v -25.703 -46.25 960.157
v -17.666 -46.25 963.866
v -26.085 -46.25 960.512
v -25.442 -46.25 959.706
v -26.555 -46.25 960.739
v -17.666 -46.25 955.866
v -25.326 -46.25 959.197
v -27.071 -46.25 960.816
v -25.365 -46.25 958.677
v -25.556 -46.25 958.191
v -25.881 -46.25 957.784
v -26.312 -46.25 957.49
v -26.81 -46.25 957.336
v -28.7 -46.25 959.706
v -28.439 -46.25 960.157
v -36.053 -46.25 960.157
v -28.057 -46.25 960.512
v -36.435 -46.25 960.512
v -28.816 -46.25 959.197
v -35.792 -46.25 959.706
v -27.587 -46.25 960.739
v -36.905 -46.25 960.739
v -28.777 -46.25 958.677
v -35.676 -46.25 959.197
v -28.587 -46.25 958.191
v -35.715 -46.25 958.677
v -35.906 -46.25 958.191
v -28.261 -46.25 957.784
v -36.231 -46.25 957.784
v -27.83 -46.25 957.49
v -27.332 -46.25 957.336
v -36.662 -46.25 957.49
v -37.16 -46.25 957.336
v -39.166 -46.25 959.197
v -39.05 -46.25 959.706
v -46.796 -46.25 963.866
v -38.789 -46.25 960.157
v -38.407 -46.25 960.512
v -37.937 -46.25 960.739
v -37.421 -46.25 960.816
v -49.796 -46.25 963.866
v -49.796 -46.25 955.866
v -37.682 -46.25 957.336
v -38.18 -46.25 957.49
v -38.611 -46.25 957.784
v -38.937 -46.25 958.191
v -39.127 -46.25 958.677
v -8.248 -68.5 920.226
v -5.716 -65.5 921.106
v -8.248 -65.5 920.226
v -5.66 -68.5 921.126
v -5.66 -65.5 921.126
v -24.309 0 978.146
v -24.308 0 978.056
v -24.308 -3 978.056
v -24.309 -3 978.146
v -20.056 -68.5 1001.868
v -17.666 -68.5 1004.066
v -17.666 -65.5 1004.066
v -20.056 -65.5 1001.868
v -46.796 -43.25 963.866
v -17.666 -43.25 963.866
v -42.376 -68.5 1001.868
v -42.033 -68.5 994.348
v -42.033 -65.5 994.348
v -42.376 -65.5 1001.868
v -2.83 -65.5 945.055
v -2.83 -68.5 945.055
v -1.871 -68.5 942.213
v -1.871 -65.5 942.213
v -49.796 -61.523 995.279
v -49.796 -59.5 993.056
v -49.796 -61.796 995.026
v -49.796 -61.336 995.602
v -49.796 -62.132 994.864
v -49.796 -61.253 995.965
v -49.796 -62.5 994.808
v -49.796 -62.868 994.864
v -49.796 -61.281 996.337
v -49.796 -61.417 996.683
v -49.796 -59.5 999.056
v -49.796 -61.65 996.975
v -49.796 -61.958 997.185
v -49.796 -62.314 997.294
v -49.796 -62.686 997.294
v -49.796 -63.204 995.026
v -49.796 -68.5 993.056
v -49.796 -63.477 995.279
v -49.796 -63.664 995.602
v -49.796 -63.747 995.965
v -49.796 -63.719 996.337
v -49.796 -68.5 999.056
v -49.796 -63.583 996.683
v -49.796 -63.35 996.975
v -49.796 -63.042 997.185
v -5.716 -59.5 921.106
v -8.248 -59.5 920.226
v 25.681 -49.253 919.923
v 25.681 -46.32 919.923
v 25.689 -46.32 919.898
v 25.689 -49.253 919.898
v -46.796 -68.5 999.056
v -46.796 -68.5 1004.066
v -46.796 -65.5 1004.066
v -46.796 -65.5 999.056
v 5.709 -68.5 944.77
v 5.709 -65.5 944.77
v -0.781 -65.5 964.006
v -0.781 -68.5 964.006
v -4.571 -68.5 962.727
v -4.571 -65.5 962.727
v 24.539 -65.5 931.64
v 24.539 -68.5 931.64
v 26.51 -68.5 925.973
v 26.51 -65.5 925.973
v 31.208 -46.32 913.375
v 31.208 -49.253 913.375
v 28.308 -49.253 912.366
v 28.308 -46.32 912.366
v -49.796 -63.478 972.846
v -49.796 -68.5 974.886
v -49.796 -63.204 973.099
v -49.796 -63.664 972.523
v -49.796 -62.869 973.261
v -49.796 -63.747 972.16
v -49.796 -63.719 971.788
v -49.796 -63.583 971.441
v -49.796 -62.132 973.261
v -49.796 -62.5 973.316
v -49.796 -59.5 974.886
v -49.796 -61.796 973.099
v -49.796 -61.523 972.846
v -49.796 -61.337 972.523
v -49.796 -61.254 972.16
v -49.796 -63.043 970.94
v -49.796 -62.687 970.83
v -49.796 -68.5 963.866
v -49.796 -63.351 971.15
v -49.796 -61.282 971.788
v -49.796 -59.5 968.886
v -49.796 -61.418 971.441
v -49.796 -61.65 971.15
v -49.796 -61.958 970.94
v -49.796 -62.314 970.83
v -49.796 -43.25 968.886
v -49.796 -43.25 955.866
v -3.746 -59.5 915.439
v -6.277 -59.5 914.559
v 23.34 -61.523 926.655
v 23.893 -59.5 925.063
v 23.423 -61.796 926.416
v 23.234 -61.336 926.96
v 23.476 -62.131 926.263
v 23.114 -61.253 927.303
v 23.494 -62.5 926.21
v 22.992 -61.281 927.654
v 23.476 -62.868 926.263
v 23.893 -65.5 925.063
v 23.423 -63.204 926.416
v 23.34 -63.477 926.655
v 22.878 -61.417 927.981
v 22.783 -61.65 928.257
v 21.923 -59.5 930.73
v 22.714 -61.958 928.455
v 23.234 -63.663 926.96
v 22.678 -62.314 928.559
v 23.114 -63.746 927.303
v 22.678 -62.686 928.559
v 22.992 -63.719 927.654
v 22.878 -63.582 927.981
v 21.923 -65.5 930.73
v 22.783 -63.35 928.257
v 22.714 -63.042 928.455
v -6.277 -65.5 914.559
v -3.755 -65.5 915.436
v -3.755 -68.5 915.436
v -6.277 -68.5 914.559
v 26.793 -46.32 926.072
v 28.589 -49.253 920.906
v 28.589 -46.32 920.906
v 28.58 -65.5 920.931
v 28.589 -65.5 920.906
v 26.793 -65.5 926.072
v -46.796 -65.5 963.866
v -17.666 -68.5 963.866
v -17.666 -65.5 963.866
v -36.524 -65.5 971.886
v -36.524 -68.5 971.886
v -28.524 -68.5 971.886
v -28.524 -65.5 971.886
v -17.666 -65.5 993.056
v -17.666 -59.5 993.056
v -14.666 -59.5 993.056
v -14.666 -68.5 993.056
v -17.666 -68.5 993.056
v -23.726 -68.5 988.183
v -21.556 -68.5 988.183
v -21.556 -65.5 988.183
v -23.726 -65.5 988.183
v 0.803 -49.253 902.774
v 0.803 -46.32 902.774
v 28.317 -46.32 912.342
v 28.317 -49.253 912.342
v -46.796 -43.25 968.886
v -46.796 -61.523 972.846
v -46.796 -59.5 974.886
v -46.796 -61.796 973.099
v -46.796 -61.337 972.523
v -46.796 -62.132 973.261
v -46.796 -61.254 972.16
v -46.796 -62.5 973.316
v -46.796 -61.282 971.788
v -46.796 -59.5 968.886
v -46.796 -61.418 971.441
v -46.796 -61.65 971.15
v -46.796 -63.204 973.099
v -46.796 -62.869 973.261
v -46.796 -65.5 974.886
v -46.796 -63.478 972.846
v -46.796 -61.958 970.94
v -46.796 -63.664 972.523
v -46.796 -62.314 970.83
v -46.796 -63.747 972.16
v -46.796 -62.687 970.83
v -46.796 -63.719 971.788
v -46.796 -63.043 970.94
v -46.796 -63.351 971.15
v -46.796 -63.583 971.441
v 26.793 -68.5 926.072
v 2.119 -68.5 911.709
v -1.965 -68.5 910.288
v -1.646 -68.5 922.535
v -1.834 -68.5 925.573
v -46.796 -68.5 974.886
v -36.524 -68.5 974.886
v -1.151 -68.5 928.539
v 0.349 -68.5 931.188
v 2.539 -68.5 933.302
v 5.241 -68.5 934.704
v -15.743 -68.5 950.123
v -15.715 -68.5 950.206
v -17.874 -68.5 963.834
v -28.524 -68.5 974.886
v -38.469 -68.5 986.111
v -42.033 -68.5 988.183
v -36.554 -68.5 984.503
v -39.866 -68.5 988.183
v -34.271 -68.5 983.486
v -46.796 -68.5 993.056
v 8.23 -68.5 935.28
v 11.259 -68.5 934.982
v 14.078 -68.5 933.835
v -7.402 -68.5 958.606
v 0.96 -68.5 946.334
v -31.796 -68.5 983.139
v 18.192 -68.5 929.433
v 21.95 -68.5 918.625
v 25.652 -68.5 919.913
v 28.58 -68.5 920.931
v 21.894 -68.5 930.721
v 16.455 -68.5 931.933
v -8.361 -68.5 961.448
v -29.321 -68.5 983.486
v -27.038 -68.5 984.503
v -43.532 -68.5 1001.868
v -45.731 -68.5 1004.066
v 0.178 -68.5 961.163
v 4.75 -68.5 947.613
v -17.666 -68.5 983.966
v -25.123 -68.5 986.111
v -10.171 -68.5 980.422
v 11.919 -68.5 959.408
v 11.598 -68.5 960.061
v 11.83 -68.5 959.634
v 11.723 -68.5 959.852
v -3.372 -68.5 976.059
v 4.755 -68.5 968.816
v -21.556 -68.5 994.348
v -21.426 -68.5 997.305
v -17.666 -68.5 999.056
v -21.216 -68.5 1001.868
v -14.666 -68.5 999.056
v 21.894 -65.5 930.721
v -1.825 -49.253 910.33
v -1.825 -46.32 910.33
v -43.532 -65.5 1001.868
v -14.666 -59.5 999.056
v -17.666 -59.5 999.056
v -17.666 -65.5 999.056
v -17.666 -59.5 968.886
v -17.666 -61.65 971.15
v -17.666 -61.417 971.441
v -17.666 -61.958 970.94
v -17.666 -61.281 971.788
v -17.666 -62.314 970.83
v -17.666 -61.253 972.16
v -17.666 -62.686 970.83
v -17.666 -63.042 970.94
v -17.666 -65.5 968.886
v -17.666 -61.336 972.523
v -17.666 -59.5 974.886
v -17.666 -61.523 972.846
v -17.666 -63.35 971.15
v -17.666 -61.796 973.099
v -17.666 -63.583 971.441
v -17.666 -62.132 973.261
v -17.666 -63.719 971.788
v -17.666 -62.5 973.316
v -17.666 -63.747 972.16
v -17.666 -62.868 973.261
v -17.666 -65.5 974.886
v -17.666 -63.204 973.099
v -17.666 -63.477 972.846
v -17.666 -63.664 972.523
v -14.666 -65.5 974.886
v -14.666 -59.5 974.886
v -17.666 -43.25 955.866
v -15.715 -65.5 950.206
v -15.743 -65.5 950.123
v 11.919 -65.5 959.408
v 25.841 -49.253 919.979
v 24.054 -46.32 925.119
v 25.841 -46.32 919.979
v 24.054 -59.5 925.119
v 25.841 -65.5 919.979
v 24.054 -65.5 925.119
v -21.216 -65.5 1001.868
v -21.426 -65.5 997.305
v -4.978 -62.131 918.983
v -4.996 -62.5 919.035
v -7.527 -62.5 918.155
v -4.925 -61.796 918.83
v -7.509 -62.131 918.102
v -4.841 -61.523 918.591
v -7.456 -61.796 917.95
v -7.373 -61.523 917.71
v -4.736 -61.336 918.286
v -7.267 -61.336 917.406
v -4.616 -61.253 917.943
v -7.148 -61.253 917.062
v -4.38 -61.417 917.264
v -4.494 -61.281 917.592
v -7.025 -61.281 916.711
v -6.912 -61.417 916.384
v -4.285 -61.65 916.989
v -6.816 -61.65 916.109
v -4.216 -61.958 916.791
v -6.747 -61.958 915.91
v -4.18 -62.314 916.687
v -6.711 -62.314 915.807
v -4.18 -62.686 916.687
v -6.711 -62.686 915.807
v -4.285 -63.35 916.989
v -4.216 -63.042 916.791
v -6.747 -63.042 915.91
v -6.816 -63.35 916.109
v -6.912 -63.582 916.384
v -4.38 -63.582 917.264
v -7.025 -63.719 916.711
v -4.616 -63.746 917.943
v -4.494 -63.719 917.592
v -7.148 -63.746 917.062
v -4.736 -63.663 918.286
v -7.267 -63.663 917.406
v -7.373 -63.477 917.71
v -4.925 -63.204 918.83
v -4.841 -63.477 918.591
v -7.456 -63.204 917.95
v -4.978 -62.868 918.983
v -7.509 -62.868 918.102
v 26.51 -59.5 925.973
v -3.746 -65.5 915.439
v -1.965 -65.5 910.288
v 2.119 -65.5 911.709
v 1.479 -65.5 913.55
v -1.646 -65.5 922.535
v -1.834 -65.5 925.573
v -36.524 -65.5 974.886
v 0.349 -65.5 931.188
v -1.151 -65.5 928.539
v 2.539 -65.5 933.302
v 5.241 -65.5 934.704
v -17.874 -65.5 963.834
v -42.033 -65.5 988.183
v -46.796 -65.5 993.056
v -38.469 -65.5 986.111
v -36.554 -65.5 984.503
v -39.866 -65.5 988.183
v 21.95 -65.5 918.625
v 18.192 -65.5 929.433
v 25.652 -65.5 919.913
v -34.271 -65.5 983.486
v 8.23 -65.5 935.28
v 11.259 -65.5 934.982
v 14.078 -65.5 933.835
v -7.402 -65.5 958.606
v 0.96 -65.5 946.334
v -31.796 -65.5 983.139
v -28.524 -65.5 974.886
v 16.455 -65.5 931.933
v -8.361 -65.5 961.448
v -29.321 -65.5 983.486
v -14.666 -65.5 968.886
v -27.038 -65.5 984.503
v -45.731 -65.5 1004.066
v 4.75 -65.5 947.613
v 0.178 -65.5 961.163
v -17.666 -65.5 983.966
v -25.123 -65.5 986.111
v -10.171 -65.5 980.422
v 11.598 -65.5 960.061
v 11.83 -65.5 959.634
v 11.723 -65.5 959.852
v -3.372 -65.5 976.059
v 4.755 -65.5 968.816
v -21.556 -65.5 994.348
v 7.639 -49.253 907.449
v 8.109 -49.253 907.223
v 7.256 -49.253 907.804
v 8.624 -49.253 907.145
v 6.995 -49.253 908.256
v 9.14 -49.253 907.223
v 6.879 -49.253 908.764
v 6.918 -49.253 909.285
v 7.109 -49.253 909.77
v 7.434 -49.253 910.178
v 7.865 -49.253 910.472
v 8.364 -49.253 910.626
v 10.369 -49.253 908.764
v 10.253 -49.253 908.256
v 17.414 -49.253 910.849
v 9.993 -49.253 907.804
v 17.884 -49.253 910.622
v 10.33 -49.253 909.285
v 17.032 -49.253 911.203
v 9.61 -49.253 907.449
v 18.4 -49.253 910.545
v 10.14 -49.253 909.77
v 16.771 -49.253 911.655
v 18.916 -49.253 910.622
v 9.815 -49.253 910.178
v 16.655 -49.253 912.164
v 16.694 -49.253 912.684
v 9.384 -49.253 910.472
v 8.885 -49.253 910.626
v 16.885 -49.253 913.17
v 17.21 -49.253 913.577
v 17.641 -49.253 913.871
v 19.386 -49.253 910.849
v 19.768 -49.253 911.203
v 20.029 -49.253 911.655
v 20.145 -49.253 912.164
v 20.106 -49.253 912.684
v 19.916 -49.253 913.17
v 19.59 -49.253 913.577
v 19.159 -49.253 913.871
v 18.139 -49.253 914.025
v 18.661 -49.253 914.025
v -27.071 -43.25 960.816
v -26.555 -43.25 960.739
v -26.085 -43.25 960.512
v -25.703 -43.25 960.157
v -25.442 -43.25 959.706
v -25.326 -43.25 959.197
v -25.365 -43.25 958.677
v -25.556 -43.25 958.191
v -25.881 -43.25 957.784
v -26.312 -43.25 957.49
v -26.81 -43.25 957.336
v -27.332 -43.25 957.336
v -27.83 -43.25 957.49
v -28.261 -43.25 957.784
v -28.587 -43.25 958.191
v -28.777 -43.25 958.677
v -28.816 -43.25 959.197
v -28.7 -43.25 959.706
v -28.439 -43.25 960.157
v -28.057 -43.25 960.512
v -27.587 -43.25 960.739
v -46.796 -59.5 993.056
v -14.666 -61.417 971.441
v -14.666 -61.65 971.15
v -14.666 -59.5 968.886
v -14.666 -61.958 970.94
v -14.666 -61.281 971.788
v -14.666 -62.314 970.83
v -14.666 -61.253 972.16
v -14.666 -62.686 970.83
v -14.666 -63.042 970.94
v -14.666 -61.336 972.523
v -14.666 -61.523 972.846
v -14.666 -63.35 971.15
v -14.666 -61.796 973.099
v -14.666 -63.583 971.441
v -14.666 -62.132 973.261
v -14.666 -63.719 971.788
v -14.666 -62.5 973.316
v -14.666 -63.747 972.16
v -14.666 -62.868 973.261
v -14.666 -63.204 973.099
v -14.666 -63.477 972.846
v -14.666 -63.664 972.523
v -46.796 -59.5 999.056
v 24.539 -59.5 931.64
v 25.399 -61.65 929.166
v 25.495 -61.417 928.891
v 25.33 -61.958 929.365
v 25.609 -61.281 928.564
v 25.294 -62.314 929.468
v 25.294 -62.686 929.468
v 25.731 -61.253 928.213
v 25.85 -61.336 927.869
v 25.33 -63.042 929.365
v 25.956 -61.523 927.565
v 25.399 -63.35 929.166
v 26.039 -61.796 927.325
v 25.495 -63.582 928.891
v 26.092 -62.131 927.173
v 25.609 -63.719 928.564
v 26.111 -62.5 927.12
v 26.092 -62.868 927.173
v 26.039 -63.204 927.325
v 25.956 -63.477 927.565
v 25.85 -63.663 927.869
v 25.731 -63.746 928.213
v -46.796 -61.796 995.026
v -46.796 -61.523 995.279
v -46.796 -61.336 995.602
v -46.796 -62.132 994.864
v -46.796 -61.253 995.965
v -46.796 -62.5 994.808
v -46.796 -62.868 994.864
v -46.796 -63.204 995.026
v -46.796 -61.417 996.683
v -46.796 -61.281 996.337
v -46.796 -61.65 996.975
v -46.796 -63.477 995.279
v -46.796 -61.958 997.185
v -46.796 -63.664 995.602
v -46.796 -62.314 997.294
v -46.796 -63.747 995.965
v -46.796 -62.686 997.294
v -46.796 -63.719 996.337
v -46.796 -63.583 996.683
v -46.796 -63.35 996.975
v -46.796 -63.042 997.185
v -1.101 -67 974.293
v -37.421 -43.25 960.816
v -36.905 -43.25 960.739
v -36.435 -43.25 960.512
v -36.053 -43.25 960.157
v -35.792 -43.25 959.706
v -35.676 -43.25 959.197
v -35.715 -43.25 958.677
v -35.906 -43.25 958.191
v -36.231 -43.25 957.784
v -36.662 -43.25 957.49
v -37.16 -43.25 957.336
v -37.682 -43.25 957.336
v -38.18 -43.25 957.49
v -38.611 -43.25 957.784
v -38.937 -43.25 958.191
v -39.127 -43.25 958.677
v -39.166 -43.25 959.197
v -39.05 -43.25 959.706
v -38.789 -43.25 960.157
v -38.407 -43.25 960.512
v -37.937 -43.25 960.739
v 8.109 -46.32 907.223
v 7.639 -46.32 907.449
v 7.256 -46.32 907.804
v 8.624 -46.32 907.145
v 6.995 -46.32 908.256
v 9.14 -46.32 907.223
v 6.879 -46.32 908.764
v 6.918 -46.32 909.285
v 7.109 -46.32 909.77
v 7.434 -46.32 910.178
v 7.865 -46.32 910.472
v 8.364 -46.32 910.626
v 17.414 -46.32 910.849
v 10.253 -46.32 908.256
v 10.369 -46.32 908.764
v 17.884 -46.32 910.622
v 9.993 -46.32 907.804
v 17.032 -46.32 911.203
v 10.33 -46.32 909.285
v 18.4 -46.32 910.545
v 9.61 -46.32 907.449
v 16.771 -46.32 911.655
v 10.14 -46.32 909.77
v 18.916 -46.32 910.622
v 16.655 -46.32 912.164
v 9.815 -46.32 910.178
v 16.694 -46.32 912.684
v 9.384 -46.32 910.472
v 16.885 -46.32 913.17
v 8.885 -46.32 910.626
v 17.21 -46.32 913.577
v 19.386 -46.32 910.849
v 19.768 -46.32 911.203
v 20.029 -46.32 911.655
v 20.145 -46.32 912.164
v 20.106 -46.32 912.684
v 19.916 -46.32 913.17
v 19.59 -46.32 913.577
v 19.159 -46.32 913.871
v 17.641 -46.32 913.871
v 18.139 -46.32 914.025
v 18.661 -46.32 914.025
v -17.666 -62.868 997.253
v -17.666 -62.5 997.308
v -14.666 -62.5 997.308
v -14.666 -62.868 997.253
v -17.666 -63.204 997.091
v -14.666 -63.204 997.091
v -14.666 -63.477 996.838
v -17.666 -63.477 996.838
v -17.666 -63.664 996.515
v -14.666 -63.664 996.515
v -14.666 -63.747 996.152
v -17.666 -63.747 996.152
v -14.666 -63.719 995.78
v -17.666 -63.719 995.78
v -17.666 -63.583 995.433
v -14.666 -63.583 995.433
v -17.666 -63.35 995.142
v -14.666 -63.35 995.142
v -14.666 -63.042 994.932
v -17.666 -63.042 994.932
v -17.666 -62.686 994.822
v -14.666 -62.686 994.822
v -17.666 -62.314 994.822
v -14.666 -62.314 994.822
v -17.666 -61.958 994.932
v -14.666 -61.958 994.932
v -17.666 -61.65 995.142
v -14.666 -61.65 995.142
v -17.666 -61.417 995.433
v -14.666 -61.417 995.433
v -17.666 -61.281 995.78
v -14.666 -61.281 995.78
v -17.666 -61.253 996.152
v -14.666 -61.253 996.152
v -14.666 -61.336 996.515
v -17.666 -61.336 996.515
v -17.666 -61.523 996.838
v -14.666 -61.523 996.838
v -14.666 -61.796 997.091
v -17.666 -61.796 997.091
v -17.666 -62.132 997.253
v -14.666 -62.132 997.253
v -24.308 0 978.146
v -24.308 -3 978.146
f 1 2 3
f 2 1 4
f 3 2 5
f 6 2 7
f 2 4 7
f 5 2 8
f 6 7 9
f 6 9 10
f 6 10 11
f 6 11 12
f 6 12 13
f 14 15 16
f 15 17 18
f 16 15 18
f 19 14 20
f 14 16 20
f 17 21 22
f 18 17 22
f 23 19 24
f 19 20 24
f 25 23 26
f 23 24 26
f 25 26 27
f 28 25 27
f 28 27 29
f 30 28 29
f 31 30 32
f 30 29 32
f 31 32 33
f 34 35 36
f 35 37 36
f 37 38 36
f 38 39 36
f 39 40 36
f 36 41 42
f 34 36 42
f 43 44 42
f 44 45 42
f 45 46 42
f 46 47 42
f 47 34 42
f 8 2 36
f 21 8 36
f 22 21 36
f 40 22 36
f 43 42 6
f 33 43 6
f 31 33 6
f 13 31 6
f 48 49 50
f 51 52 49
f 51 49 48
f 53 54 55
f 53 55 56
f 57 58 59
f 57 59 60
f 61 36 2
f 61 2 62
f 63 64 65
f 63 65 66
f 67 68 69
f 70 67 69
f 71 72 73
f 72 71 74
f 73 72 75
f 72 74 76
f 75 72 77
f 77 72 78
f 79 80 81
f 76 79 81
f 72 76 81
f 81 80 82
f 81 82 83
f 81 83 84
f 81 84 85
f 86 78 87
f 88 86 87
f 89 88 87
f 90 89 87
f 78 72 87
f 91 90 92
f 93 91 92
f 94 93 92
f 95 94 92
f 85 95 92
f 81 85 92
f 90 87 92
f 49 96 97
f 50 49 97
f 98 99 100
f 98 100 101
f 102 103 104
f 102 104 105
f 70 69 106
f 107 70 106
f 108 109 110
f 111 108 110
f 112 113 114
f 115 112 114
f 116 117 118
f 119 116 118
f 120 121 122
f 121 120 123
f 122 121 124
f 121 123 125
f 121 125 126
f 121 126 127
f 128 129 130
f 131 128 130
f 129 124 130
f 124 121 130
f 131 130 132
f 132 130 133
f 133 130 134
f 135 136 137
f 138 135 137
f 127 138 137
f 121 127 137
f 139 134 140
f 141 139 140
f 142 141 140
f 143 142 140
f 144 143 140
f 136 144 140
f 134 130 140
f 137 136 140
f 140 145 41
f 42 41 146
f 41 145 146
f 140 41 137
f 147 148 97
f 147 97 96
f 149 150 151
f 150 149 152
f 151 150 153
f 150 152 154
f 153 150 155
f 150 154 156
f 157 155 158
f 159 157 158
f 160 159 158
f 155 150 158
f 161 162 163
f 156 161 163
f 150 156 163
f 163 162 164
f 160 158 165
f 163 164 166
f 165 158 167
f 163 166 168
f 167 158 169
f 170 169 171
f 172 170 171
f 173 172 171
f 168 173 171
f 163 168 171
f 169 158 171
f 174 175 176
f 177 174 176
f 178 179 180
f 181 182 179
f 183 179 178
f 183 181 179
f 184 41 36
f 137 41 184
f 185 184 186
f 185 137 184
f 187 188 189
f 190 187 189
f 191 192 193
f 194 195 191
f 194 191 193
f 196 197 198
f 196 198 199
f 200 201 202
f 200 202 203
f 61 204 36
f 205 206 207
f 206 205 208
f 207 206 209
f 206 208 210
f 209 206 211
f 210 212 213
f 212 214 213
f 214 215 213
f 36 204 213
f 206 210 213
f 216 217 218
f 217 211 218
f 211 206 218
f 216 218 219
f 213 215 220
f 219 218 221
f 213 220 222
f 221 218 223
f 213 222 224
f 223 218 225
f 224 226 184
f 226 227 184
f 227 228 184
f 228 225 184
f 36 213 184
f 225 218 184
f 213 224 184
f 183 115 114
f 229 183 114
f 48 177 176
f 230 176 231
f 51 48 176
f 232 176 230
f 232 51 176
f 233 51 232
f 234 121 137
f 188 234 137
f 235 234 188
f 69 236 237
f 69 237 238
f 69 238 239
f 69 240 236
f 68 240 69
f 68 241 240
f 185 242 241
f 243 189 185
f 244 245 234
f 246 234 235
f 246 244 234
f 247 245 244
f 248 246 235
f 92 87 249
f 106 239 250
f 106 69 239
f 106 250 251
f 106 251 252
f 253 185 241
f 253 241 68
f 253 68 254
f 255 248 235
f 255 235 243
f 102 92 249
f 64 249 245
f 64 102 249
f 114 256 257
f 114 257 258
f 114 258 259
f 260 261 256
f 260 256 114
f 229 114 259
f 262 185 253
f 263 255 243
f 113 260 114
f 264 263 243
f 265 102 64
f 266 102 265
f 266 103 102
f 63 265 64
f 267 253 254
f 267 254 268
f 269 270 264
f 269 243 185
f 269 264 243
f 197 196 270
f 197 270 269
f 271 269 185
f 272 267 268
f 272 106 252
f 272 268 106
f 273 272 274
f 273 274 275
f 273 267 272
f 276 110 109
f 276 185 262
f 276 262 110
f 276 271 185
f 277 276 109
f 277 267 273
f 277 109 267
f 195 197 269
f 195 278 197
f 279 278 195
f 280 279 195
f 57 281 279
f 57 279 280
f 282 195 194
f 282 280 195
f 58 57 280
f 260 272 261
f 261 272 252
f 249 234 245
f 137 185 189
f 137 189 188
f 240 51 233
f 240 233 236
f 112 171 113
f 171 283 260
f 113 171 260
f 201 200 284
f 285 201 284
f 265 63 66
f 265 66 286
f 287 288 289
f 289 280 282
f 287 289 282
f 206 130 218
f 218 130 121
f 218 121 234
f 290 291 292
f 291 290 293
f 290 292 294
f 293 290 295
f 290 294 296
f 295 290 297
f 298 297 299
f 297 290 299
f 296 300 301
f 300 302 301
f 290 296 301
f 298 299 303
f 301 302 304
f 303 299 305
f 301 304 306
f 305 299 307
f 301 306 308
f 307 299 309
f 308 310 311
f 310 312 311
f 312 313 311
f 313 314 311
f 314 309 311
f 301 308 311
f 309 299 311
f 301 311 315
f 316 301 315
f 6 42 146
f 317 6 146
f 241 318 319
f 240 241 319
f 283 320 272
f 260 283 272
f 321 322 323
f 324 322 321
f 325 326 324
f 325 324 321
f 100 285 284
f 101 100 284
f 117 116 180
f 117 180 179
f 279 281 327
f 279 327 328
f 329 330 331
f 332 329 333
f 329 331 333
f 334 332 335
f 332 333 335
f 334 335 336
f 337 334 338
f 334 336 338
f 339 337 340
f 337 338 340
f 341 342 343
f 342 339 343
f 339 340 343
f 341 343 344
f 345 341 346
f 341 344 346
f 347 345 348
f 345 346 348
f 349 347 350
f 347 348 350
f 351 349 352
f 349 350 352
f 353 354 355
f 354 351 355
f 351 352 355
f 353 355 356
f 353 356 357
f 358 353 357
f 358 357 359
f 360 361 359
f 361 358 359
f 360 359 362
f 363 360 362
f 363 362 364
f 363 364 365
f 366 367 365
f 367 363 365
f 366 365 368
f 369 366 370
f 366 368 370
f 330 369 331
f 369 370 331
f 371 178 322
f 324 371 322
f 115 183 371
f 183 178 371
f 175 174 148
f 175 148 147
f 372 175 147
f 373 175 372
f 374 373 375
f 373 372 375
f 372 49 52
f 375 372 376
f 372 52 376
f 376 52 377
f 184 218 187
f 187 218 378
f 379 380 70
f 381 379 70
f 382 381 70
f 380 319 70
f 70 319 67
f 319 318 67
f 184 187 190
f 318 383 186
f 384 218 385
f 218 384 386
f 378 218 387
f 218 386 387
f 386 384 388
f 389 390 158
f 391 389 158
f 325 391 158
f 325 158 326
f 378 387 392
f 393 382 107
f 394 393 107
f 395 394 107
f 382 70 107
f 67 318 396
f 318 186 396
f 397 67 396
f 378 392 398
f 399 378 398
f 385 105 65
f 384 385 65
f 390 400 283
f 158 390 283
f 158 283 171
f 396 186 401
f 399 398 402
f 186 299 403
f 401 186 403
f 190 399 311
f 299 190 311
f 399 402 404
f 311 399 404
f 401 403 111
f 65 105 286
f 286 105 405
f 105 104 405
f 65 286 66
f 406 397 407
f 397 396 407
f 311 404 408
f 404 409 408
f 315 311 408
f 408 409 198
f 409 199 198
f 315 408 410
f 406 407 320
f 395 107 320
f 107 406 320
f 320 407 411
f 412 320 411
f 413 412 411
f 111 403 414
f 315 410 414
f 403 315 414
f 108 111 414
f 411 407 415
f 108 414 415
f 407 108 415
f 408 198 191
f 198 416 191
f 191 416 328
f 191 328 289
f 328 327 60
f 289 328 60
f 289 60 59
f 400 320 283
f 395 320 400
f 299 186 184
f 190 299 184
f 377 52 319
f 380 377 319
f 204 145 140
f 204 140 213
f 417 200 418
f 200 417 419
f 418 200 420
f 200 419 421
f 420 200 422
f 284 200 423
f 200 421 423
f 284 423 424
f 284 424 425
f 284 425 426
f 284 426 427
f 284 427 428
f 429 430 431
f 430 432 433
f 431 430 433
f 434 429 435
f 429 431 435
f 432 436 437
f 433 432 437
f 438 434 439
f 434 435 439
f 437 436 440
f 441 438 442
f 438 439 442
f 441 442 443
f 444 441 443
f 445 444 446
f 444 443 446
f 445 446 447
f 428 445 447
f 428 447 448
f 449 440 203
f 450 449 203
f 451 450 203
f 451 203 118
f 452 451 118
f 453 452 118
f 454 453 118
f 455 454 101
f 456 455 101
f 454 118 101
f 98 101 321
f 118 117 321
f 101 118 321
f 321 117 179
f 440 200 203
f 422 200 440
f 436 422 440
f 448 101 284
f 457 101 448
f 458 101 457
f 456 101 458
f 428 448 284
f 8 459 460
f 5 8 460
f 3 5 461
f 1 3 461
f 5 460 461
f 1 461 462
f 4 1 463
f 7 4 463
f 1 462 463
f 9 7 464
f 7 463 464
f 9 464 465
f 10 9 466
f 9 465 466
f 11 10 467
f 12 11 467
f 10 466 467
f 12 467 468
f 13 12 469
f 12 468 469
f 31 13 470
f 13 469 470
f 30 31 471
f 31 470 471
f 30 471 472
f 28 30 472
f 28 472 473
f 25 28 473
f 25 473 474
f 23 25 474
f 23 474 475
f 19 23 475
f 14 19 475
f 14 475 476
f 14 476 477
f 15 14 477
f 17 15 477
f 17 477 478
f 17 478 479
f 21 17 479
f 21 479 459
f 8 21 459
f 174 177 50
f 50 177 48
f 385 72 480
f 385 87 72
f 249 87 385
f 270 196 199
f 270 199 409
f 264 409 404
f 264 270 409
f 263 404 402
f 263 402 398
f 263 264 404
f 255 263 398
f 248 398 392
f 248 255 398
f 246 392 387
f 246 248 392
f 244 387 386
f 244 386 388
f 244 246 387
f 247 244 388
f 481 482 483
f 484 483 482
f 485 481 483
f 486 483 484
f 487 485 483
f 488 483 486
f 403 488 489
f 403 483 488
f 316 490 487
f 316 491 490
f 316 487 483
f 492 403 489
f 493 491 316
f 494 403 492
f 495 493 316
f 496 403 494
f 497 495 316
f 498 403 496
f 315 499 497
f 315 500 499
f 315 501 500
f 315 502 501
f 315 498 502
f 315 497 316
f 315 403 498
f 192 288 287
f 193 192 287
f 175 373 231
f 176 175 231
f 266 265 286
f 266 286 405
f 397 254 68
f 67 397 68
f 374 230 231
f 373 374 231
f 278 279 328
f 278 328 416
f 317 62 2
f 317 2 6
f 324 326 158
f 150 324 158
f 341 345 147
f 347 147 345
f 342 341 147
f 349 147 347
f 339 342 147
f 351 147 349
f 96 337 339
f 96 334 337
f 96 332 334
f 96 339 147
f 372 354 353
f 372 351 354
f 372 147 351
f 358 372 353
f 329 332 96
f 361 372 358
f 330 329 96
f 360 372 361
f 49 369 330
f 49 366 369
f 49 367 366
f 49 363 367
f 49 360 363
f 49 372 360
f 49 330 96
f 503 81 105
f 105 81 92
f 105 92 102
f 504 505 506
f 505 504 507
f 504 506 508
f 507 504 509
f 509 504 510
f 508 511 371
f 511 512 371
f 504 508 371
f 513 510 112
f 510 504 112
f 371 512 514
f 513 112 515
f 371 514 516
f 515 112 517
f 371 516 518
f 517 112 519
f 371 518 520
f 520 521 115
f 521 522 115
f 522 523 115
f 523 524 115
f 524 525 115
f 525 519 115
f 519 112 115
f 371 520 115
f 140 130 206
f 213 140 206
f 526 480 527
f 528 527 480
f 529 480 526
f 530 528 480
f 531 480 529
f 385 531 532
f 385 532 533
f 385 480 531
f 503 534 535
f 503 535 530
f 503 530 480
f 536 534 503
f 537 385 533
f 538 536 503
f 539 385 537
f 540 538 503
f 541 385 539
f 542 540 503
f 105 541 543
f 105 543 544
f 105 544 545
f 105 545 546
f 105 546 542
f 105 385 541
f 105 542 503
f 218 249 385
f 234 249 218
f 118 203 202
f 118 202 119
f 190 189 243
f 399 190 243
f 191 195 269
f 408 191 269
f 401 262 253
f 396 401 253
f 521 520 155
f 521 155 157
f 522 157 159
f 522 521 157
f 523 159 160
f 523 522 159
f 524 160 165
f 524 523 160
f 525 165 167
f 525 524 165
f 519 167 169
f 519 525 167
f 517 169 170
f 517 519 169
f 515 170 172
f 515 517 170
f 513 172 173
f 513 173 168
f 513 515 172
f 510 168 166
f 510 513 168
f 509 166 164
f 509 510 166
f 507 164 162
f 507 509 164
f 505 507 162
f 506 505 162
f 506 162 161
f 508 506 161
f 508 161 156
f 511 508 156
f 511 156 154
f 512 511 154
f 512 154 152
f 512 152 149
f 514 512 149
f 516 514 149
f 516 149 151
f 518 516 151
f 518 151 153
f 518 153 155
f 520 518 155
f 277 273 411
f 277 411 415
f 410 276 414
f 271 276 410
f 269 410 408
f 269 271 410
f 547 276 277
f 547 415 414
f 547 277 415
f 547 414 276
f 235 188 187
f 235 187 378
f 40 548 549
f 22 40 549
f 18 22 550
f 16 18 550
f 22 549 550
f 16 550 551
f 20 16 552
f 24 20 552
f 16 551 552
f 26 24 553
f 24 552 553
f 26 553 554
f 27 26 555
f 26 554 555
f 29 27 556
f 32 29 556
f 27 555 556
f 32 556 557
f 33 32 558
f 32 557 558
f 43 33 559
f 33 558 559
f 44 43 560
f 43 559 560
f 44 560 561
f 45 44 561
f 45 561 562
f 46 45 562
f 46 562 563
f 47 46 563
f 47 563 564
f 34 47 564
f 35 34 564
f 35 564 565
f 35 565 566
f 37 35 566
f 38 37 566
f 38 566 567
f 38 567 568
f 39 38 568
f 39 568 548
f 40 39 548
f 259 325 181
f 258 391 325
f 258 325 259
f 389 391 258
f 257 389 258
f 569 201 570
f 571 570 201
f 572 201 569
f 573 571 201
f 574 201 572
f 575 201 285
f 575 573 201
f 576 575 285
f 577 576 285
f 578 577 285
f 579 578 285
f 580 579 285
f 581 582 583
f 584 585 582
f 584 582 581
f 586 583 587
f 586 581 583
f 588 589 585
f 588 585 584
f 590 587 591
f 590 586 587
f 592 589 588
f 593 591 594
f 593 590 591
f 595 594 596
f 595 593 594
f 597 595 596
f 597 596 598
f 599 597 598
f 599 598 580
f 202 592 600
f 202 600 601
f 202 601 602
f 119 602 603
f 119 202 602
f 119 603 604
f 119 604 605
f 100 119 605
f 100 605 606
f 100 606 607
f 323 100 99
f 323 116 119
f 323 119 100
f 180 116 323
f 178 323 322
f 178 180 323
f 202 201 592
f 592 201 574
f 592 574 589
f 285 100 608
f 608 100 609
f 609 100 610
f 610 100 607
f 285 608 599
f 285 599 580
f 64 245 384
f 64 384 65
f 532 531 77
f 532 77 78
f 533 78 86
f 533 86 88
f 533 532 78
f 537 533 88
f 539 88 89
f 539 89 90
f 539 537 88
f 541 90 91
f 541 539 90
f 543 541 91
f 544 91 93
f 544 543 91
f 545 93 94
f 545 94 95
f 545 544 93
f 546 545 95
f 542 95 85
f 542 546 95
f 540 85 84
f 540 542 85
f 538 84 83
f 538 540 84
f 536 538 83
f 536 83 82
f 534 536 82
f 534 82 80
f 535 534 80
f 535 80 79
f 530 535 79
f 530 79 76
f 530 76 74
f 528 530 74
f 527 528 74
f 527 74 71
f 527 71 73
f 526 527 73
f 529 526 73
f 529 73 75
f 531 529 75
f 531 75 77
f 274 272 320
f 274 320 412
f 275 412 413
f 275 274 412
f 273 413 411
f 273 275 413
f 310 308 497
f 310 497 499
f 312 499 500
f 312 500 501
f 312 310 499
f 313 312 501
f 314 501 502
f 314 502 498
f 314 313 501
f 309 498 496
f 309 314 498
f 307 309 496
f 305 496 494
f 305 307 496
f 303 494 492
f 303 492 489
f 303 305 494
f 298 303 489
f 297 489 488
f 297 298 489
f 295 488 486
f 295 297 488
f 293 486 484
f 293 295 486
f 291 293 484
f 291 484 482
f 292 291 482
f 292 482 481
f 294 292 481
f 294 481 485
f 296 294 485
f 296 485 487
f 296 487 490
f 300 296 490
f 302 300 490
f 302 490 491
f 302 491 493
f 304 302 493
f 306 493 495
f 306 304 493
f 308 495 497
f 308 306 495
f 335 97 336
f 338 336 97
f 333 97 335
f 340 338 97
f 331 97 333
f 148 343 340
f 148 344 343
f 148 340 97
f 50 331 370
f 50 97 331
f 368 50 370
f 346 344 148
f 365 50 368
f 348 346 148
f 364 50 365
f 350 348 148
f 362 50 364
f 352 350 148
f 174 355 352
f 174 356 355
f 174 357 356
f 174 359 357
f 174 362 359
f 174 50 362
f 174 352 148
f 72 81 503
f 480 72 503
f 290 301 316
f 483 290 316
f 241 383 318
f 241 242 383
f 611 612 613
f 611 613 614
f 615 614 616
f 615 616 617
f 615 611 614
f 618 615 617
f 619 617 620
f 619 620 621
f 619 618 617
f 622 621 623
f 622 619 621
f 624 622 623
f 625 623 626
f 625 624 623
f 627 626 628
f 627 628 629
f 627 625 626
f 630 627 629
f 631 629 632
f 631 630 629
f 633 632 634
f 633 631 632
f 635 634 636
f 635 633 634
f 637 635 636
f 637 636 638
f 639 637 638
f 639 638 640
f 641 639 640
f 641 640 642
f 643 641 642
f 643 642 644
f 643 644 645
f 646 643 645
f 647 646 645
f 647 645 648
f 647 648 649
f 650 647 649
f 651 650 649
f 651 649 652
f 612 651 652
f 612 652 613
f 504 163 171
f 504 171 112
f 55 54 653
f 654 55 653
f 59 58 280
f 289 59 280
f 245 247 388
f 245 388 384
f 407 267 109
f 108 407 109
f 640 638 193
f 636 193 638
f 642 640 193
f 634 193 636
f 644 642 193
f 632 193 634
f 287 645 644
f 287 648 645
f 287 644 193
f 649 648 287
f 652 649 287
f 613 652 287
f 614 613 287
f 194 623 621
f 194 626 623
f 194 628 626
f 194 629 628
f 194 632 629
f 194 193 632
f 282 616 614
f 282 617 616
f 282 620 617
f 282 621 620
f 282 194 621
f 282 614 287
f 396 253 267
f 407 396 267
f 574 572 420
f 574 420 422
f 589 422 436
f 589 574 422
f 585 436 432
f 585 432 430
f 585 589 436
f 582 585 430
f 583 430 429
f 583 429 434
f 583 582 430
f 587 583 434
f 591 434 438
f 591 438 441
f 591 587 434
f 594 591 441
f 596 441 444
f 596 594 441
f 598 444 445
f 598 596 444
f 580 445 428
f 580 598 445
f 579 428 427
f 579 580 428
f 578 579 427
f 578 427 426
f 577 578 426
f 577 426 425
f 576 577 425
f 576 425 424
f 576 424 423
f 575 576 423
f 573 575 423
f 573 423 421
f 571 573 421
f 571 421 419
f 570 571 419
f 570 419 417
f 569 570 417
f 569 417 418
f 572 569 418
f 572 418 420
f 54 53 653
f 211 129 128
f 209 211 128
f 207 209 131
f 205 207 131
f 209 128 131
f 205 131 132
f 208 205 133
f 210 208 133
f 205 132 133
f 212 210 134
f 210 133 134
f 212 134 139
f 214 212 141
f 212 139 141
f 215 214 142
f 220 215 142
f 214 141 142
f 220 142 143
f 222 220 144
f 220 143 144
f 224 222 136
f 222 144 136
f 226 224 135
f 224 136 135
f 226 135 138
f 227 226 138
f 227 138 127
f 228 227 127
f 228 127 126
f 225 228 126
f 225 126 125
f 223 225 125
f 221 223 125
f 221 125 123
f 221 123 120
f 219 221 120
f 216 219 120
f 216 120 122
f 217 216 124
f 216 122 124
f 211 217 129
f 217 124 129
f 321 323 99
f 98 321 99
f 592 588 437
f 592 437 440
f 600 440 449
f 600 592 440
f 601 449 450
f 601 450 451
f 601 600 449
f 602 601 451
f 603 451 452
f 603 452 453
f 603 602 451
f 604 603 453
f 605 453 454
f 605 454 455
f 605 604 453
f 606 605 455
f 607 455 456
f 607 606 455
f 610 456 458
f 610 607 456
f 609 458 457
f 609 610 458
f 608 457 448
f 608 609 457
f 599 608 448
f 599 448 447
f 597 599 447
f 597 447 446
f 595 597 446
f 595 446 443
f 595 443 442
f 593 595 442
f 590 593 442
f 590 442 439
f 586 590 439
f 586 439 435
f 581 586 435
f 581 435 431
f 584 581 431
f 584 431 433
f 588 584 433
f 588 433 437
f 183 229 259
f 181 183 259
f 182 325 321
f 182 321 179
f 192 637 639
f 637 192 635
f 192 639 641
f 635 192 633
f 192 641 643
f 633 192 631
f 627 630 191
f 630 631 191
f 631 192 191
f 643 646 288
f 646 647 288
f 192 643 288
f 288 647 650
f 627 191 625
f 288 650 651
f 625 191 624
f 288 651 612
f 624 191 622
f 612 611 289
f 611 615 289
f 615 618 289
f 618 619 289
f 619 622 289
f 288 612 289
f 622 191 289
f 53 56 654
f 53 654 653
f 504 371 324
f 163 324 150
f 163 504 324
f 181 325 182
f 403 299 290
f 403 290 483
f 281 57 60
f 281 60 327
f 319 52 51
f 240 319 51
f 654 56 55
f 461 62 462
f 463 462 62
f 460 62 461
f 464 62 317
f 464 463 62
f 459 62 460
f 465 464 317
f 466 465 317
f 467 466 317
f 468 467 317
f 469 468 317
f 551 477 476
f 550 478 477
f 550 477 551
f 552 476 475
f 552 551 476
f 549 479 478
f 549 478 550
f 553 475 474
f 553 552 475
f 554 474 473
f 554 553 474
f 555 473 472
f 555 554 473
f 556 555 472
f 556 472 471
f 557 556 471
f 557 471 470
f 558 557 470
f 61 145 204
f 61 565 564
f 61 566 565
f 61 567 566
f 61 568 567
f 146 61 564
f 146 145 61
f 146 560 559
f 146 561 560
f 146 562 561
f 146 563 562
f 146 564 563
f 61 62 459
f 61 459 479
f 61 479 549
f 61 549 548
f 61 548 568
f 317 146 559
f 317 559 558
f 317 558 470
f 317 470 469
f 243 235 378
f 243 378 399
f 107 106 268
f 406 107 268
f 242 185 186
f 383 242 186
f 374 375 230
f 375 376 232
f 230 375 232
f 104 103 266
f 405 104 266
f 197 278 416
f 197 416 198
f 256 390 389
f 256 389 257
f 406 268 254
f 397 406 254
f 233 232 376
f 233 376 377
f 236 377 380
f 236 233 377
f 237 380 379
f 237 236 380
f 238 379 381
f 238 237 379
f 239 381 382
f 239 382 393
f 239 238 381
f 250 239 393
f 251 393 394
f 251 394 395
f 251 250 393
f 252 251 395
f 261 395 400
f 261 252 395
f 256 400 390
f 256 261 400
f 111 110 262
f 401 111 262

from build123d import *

# Parameters (mm, degrees)
SKETCH1_W                 = 29.13
SKETCH1_H                 = 40.2
BOSS_EXTRUDE1_DEPTH       = 3
SKETCH3_W                 = 6
SKETCH3_H                 = 3
BOSS_EXTRUDE2_DEPTH       = 3
SKETCH4_W                 = 3
SKETCH4_H                 = 6
BOSS_EXTRUDE3_DEPTH       = 6
SKETCH6_W                 = 6
SKETCH6_H                 = 3
BOSS_EXTRUDE4_DEPTH       = 2
SKETCH7_W                 = 3.000000005
SKETCH7_H                 = 6
BOSS_EXTRUDE6_DEPTH       = 6
SKETCH9_R                 = 1.25
CUT_EXTRUDE1_DEPTH        = 3
SKETCH8_R                 = 1.250000001
CUT_EXTRUDE2_DEPTH        = 3
SKETCH11_W                = 6
SKETCH11_H                = 3
BOSS_EXTRUDE7_DEPTH       = 3
SKETCH19_W                = 3
SKETCH19_H                = 6
BOSS_EXTRUDE11_DEPTH      = 6
SKETCH21_W                = 6
SKETCH21_H                = 3
BOSS_EXTRUDE12_DEPTH      = 3
SKETCH22_W                = 3
SKETCH22_H                = 6
BOSS_EXTRUDE13_DEPTH      = 6
SKETCH24_R                = 1.25
CUT_EXTRUDE5_DEPTH        = 4
SKETCH23_R                = 1.25
CUT_EXTRUDE6_DEPTH        = 4
CUT_EXTRUDE8_DEPTH        = 4
CUT_EXTRUDE11_DEPTH       = 4
SKETCH30_W                = 25.92
SKETCH30_H                = 3
CUT_EXTRUDE12_DEPTH       = 15
SKETCH33_W                = 29.17650364
SKETCH33_H                = 3
BOSS_EXTRUDE14_DEPTH      = 40.3
SKETCH34_W                = 21.00258235
SKETCH34_H                = 3
CUT_EXTRUDE15_DEPTH       = 25
CUT_EXTRUDE16_DEPTH       = 5
SKETCH37_W                = 4.5
SKETCH37_H                = 3
SKETCH37_W_2              = 1.5
BOSS_EXTRUDE15_DEPTH      = 3
BOSS_EXTRUDE16_DEPTH      = 6
SKETCH41_W                = 6
SKETCH41_H                = 3
BOSS_EXTRUDE17_DEPTH      = 2.8
BOSS_EXTRUDE18_DEPTH      = 6
SKETCH44_R                = 1.25
CUT_EXTRUDE19_DEPTH       = 7
SKETCH45_R                = 1.249999996
CUT_EXTRUDE20_DEPTH       = 5
SKETCH46_W                = 5.02
SKETCH46_H                = 3
BOSS_EXTRUDE19_DEPTH      = 3
SKETCH48_W                = 3
SKETCH48_H                = 5.02
BOSS_EXTRUDE20_DEPTH      = 22.25
BOSS_EXTRUDE22_DEPTH      = 29.13
BOSS_EXTRUDE22_DEPTH_BACK = 3
SKETCH50_W                = 8
SKETCH50_H                = 3
SKETCH51_R                = 1.75
CUT_EXTRUDE21_DEPTH       = 5
SKETCH56_W                = 3.994197227
SKETCH56_H                = 3.994197227
CUT_EXTRUDE26_DEPTH       = 0.1
FILLET4_START             = -19
FILLET4_DEPTH             = 5
BOSS_EXTRUDE28_DEPTH      = 0.21
BOSS_EXTRUDE29_DEPTH      = 3
BOSS_EXTRUDE30_DEPTH      = 1.95
BOSS_EXTRUDE30_DEPTH_BACK = 4
SKETCH68_W                = 4.32399603
SKETCH68_H                = 3
SKETCH69_W                = 3.919724064
SKETCH69_H                = 3
BOSS_EXTRUDE31_DEPTH      = 1.83
SKETCH70_W                = 5.44243662
SKETCH70_H                = 3
BOSS_EXTRUDE32_DEPTH      = 3.1
BOSS_EXTRUDE33_DEPTH      = 19.18
SKETCH72_W                = 3.07
SKETCH72_H                = 2.93342148
BOSS_EXTRUDE34_DEPTH      = 8
SKETCH73_W                = 8
SKETCH73_H                = 2.93342148
BOSS_EXTRUDE35_DEPTH      = 29.13
SKETCH74_R                = 1.75
CUT_EXTRUDE27_DEPTH       = 5
BOSS_EXTRUDE36_DEPTH      = 3
BOSS_EXTRUDE37_DEPTH      = 3
SKETCH77_W                = 8
SKETCH77_H                = 3
CUT_EXTRUDE28_DEPTH       = 10
CUT_EXTRUDE29_DEPTH       = 10


with BuildPart() as part:
    # Sketch1 → Boss-Extrude1 (new body)
    with BuildSketch(Plane(origin=(0, 0, 0), x_dir=(1, 0, 0), z_dir=(0, 1, 0))):
        with Locations((-32.231128585, -983.966354464)):
            Rectangle(SKETCH1_W, SKETCH1_H)
        with BuildLine():
            Line((-15.507778999, -950.239071497), (-17.666128585, -963.866354464))
            Line((-17.666128585, -963.866354464), (-17.666128585, -983.966354464))
            add(Edge.make_bspline(
                [(11.825950039, -959.709415703), (1.028086592, -976.494542347), (-17.666128585, -983.966354464)],
                knots=[0, 0, 0, 1, 1, 1], degree=2))
            Line((11.825950039, -959.709415703), (-15.497121464, -950.208422428))
            Line((-15.497121464, -950.208422428), (-15.507778999, -950.239071497))
        make_face()
    extrude(amount=-BOSS_EXTRUDE1_DEPTH)

    # Sketch3 → Boss-Extrude2 (add)
    with BuildSketch(Plane.ZY.offset(46.796128585)):
        with Locations((971.886354464, -1.5)):
            Rectangle(SKETCH3_W, SKETCH3_H)
    extrude(amount=BOSS_EXTRUDE2_DEPTH)

    # Sketch4 → Boss-Extrude3 (add)
    with BuildSketch(Plane.XZ.offset(3)):
        with Locations((-48.296128585, 971.886354464)):
            Rectangle(SKETCH4_W, SKETCH4_H)
    extrude(amount=BOSS_EXTRUDE3_DEPTH)

    # Sketch6 → Boss-Extrude4 (add)
    with BuildSketch(Plane(origin=(-17.666128585, 0, 0), x_dir=(0, 0, -1), z_dir=(1, 0, 0))):
        with Locations((-971.886354464, -1.5)):
            Rectangle(SKETCH6_W, SKETCH6_H)
    extrude(amount=BOSS_EXTRUDE4_DEPTH)

    # Sketch7 → Boss-Extrude6 (add)
    with BuildSketch(Plane.XZ.offset(3)):
        with Locations((-16.166128583, 971.886354464)):
            Rectangle(SKETCH7_W, SKETCH7_H)
    extrude(amount=BOSS_EXTRUDE6_DEPTH)

    # Sketch9 → Cut-Extrude1 (cut)
    with BuildSketch(Plane.ZY.offset(17.666128585)):
        with Locations((972.066354464, -6)):
            Circle(SKETCH9_R)
    extrude(amount=-CUT_EXTRUDE1_DEPTH, mode=Mode.SUBTRACT)

    # Sketch8 → Cut-Extrude2 (cut)
    with BuildSketch(Plane(origin=(-49.796128585, 0, 0), x_dir=(0, 0, -1), z_dir=(1, 0, 0))):
        with Locations(Location((-972.066168305, -5.999675203, 0), (0, 0, 180))):
            Circle(SKETCH8_R)
    extrude(amount=CUT_EXTRUDE2_DEPTH, mode=Mode.SUBTRACT)

    # Sketch11 → Boss-Extrude7 (add)
    with BuildSketch(Plane.ZY.offset(46.796128585)):
        with Locations((996.056354464, -1.5)):
            Rectangle(SKETCH11_W, SKETCH11_H)
    extrude(amount=BOSS_EXTRUDE7_DEPTH)

    # Sketch19 → Boss-Extrude11 (add)
    with BuildSketch(Plane.XZ.offset(3)):
        with Locations((-48.296128585, 996.056354464)):
            Rectangle(SKETCH19_W, SKETCH19_H)
    extrude(amount=BOSS_EXTRUDE11_DEPTH)

    # Sketch21 → Boss-Extrude12 (add)
    with BuildSketch(Plane(origin=(-17.666128585, 0, 0), x_dir=(0, 0, -1), z_dir=(1, 0, 0))):
        with Locations((-996.056354464, -1.5)):
            Rectangle(SKETCH21_W, SKETCH21_H)
    extrude(amount=BOSS_EXTRUDE12_DEPTH)

    # Sketch22 → Boss-Extrude13 (add)
    with BuildSketch(Plane.XZ.offset(3)):
        with Locations((-16.166128585, 996.056354464)):
            Rectangle(SKETCH22_W, SKETCH22_H)
    extrude(amount=BOSS_EXTRUDE13_DEPTH)

    # Sketch24 → Cut-Extrude5 (cut)
    with BuildSketch(Plane(origin=(-46.796128585, 0, 0), x_dir=(0, 0, -1), z_dir=(1, 0, 0))):
        with Locations((-996.058375158, -6)):
            Circle(SKETCH24_R)
    extrude(amount=-CUT_EXTRUDE5_DEPTH, mode=Mode.SUBTRACT)

    # Sketch23 → Cut-Extrude6 (cut)
    with BuildSketch(Plane.ZY.offset(17.666128585)):
        with Locations((996.058154464, -6)):
            Circle(SKETCH23_R)
    extrude(amount=-CUT_EXTRUDE6_DEPTH, mode=Mode.SUBTRACT)

    # Sketch28 → Cut-Extrude8 (cut)
    with BuildSketch(Plane(origin=(0, 0, 0), x_dir=(1, 0, 0), z_dir=(0, 1, 0))):
        Polygon((-39.266128585, -975.05646378), (-24.308019321, -978.056409122), (-24.326128585, -981.056354464), (-39.266128585, -978.146354464), align=None)
    extrude(amount=-CUT_EXTRUDE8_DEPTH, mode=Mode.SUBTRACT)

    # Sketch29 → Cut-Extrude11 (cut)
    with BuildSketch(Plane(origin=(0, 0, 0), x_dir=(1, 0, 0), z_dir=(0, 1, 0))):
        Polygon((-39.266128585, -975.05646378), (-39.865804676, -988.183184315), (-42.032837695, -988.183184315), (-42.032837695, -994.347976596), (-42.376382193, -1001.868057312), (-43.532474114, -1001.868057312), (-45.730771266, -1004.066354464), (-39.266128585, -1004.066354464), (-39.266128585, -988.183184315), align=None)
        Polygon((-24.308019321, -978.056409122), (-24.326128585, -1004.066354464), (-17.666128585, -1004.066354464), (-20.056128585, -1001.868057312), (-21.216128585, -1001.868057312), (-21.426128585, -997.305136389), (-21.556128585, -994.347976596), (-21.556128585, -988.183184315), (-23.726128585, -988.183184315), align=None)
    extrude(amount=-CUT_EXTRUDE11_DEPTH, mode=Mode.SUBTRACT)


with BuildPart() as cut_extrude11_piece_1:
    # of the separate pieces the step leaves, piece 1, a body of its own (cut_extrude11_pieces)
    add(part.part.solids().sort_by_distance((-17.666128585, 0, 983.966354464))[0])


with BuildPart() as cut_extrude11_piece_2:
    # of the separate pieces the step leaves, piece 2, a body of its own (cut_extrude11_pieces)
    add(part.part.solids().sort_by_distance((-24.326128585, 0, 1004.066354464))[0])


with BuildPart() as cut_extrude12_tool:
    # Sketch30 → Cut-Extrude12 (new body)
    with BuildSketch(Plane.ZY.offset(39.266128585)):
        with Locations((991.106354464, -1.5)):
            Rectangle(SKETCH30_W, SKETCH30_H)
    extrude(amount=-CUT_EXTRUDE12_DEPTH)


with BuildPart() as cut_extrude11_piece_1_1:
    add(cut_extrude11_piece_1.part)

    # Cut-Extrude12: cut by cut_extrude12_tool
    add(cut_extrude12_tool.part, mode=Mode.SUBTRACT)

    # Sketch33 → Boss-Extrude14 (add)
    with BuildSketch(Plane(origin=(-296.443416752, 0, 852.515567448), x_dir=(-0.9445255798324886, 0, -0.32843786176703366), z_dir=(0.3284378617670337, 0, -0.9445255798324887))):
        with Locations((-311.77524668, -1.5)):
            Rectangle(SKETCH33_W, SKETCH33_H)
    extrude(amount=BOSS_EXTRUDE14_DEPTH)

    # Sketch34 → Cut-Extrude15 (cut)
    with BuildSketch(Plane(origin=(-283.207370923, 0, 814.451186581), x_dir=(-0.9445255798324887, 0, -0.32843786176703327), z_dir=(0.32843786176703327, 0, -0.9445255798324887))):
        with Locations((-311.942483261, -1.5)):
            Rectangle(SKETCH34_W, SKETCH34_H)
    extrude(amount=-CUT_EXTRUDE15_DEPTH, mode=Mode.SUBTRACT)

    # Sketch35 → Cut-Extrude16 (cut)
    with BuildSketch(Plane(origin=(0, 0, 0), x_dir=(1, 0, 0), z_dir=(0, 1, 0))):
        Polygon((-6.699400727, -937.069026653), (11.67040627, -948.187810964), (13.138075545, -943.967069892), align=None)
    extrude(amount=-CUT_EXTRUDE16_DEPTH, mode=Mode.SUBTRACT)

    # Sketch37 → Boss-Extrude15 (add)
    with BuildSketch(Plane(origin=(280.946295288, 0, 97.69285498), x_dir=(-0.32843786176743117, 0, 0.9445255798323505), z_dir=(-0.9445255798323505, 0, -0.32843786176743117))):
        with Locations((868.136002588, -1.5)):
            Rectangle(SKETCH37_W, SKETCH37_H)
        with Locations((871.136002588, -1.5)):
            Rectangle(SKETCH37_W_2, SKETCH37_H)
    extrude(amount=BOSS_EXTRUDE15_DEPTH)

    # Sketch39 → Boss-Extrude16 (add)
    with BuildSketch(Plane.XZ.offset(3)):
        Polygon((-6.277028676, 914.559020058), (-3.745700122, 915.439233528), (-5.716327292, 921.106387007), (-8.247655846, 920.226173537), align=None)
    extrude(amount=BOSS_EXTRUDE16_DEPTH)

    # Sketch41 → Boss-Extrude17 (add)
    with BuildSketch(Plane(origin=(308.258672657, 0, 107.190129606), x_dir=(0.3284378617670337, 0, -0.9445255798324887), z_dir=(0.9445255798324887, 0, 0.3284378617670337))):
        with Locations((-868.898439213, -1.5)):
            Rectangle(SKETCH41_W, SKETCH41_H)
    extrude(amount=BOSS_EXTRUDE17_DEPTH)

    # Sketch42 → Boss-Extrude18 (add)
    with BuildSketch(Plane.XZ.offset(3)):
        Polygon((23.893176542, 925.063208116), (21.922549371, 930.730361595), (24.538885227, 931.640134472), (26.509512398, 925.972980993), align=None)
    extrude(amount=BOSS_EXTRUDE18_DEPTH)

    # Sketch44 → Cut-Extrude19 (cut)
    with BuildSketch(Plane(origin=(278.112718549, 0, 96.707541395), x_dir=(0.32843786176743106, 0, -0.9445255798323505), z_dir=(0.9445255798323505, 0, 0.32843786176743106))):
        with Locations(Location((-868.443002584, -6.00009913, 0), (0, 0, 180))):
            Circle(SKETCH44_R)
    extrude(amount=CUT_EXTRUDE19_DEPTH, mode=Mode.SUBTRACT)

    # Sketch45 → Cut-Extrude20 (cut)
    with BuildSketch(Plane(origin=(310.90334428, 0, 108.109755619), x_dir=(0.32843786176704176, 0, -0.9445255798324859), z_dir=(0.944525579832486, 0, 0.32843786176704176))):
        with Locations((-868.363002583, -6.00009913)):
            Circle(SKETCH45_R)
    extrude(amount=-CUT_EXTRUDE20_DEPTH, mode=Mode.SUBTRACT)


with BuildPart() as cut_extrude11_piece_2_1:
    add(cut_extrude11_piece_2.part)

    # Cut-Extrude12: cut by cut_extrude12_tool
    add(cut_extrude12_tool.part, mode=Mode.SUBTRACT)


with BuildPart() as body_3:
    # Mirror1: mirrored copy
    add(cut_extrude11_piece_1_1.part.mirror(Plane(origin=(0, -9, 0), x_dir=(0, 0, 1), z_dir=(0, -1, 0))))

    # Sketch46 → Boss-Extrude19 (add)
    with BuildSketch(Plane.ZY.offset(46.796128585)):
        with Locations((966.376354464, -16.5)):
            Rectangle(SKETCH46_W, SKETCH46_H)
    extrude(amount=BOSS_EXTRUDE19_DEPTH)

    # Sketch48 → Boss-Extrude20 (add)
    with BuildSketch(Plane(origin=(0, -15, 0), x_dir=(1, 0, 0), z_dir=(0, 1, 0))):
        with Locations((-48.296128585, -966.376354464)):
            Rectangle(SKETCH48_W, SKETCH48_H)
    extrude(amount=BOSS_EXTRUDE20_DEPTH)

    # Sketch50 → Boss-Extrude22 (add, two sides: drawn at the far end of the back side and taken through both)
    with BuildSketch(Plane(origin=(-46.796128585, 0, 0), x_dir=(0, 0, -1), z_dir=(1, 0, 0)).offset(-BOSS_EXTRUDE22_DEPTH_BACK)):
        with Locations((-959.866354464, 5.75)):
            Rectangle(SKETCH50_W, SKETCH50_H)
    extrude(amount=BOSS_EXTRUDE22_DEPTH + BOSS_EXTRUDE22_DEPTH_BACK)

    # Sketch51 → Cut-Extrude21 (cut)
    with BuildSketch(Plane(origin=(0, 7.25, 0), x_dir=(1, 0, 0), z_dir=(0, 1, 0))):
        with Locations(Location((-37.42112854, -959.066354487, 0), (0, 0, 270))):
            Circle(SKETCH51_R)
        with Locations(Location((-27.07112854, -959.066354497, 0), (0, 0, 270))):
            Circle(SKETCH51_R)
    extrude(amount=-CUT_EXTRUDE21_DEPTH, mode=Mode.SUBTRACT)

    # Sketch56 → Cut-Extrude26 (cut)
    with BuildSketch(Plane(origin=(-283.207370923, 0, 814.451186581), x_dir=(-0.9445255798324892, 0, -0.32843786176703227), z_dir=(0.32843786176703227, 0, -0.9445255798324892))):
        with Locations((-299.444093473, -16.997098614)):
            Rectangle(SKETCH56_W, SKETCH56_H)
    extrude(amount=-CUT_EXTRUDE26_DEPTH, mode=Mode.SUBTRACT)

    # Fillet4: read off the stored shape, not the designer's step
    # Fillet4 outline → Fillet4 (cut)
    with BuildSketch(Plane(origin=(0, 0, 0), x_dir=(1, 0, 0), z_dir=(0, 1, 0)).offset(FILLET4_START)):
        with BuildLine():
            Line((11.815255904, -959.705697054), (11.918892326, -959.407658179))
            ThreePointArc((11.918892326, -959.407658179), (11.77847749, -959.744040081), (11.598302874, -960.060909482))
            add(Edge.make_bspline(
                [(11.825950039, -959.709415703), (11.712561825, -959.885676085), (11.598302874, -960.060909482)],
                knots=[0, 0, 0, 0.010500986, 0.010500986, 0.010500986], degree=2))
            Line((11.825950039, -959.709415703), (11.815255904, -959.705697054))
        make_face()
    extrude(amount=FILLET4_DEPTH, mode=Mode.SUBTRACT)


with BuildPart() as body_3_2:
    # Mirror2: mirrored copy
    add(body_3.part.mirror(Plane(origin=(-13.559951136, -18, 962.196424994), x_dir=(0, 0, 1), z_dir=(0, -1, 0))))

    # Sketch63 → Boss-Extrude28 (add)
    with BuildSketch(Plane(origin=(131.691734271, 0, 20.857921628), x_dir=(-0.15643446504022615, 0, 0.9876883405951385), z_dir=(-0.9876883405951385, 0, -0.15643446504022615))):
        with BuildLine():
            add(Edge.make_bspline(
                [(954.763151571, -21), (947.864577189, -21), (940.966002807, -21)],
                knots=[0, 0, 0, 1, 1, 1], degree=2))
            Line((940.966002807, -21), (940.966002807, -18))
            add(Edge.make_bspline(
                [(954.763151571, -18), (947.864577189, -18), (940.966002807, -18)],
                knots=[0, 0, 0, 1, 1, 1], degree=2))
            Line((954.763151571, -18), (954.763151571, -21))
        make_face()
    extrude(amount=BOSS_EXTRUDE28_DEPTH)

    # Sketch67 → Boss-Extrude29 (add)
    with BuildSketch(Plane(origin=(0, -18, 0), x_dir=(1, 0, 0), z_dir=(0, 1, 0))):
        Polygon((-15.715193551, -950.206220259), (-15.742698114, -950.123028585), (-15.497121464, -950.208422428), (-15.507778999, -950.239071497), align=None)
    extrude(amount=-BOSS_EXTRUDE29_DEPTH)

    # Sketch68 → Boss-Extrude30 (add, two sides: drawn at the far end of the back side and taken through both)
    with BuildSketch(Plane(origin=(-283.240214709, 0, 814.545639139), x_dir=(-0.9445255798324883, -3.1744861168227707e-15, -0.32843786176703493), z_dir=(0.32843786176703493, -9.129225613729643e-15, -0.9445255798324883)).offset(-BOSS_EXTRUDE30_DEPTH_BACK)):
        with Locations((-299.279194071, -19.5)):
            Rectangle(SKETCH68_W, SKETCH68_H)
    extrude(amount=BOSS_EXTRUDE30_DEPTH + BOSS_EXTRUDE30_DEPTH_BACK)

    # Sketch69 → Boss-Extrude31 (add)
    with BuildSketch(Plane(origin=(-283.207370923, 0, 814.451186581), x_dir=(-0.9445255798324895, 0, -0.32843786176703144), z_dir=(0.32843786176703144, 0, -0.9445255798324895))):
        with Locations((-324.403636468, -19.5)):
            Rectangle(SKETCH69_W, SKETCH69_H)
    extrude(amount=BOSS_EXTRUDE31_DEPTH)

    # Sketch70 → Boss-Extrude32 (add)
    with BuildSketch(Plane(origin=(308.258672657, 0, 107.190129606), x_dir=(0.3284378617670337, 0, -0.9445255798324887), z_dir=(0.9445255798324887, 0, 0.3284378617670337))):
        with Locations((-863.177220903, -19.5)):
            Rectangle(SKETCH70_W, SKETCH70_H)
    extrude(amount=BOSS_EXTRUDE32_DEPTH)

    # Sketch71 → Boss-Extrude33 (add)
    with BuildSketch(Plane.XZ.offset(21)):
        Polygon((28.589002033, 920.906174309), (26.792870072, 926.071512351), (24.05374589, 925.119042552), (25.841248137, 919.978521948), align=None)
    extrude(amount=BOSS_EXTRUDE33_DEPTH)

    # Sketch72 → Boss-Extrude34 (add)
    with BuildSketch(Plane(origin=(-282.606329636, 0, 812.722704769), x_dir=(-0.9445255798324861, 0, -0.3284378617670412), z_dir=(0.3284378617670412, 0, -0.9445255798324861))):
        with Locations((-327.9284985, -38.71328926)):
            Rectangle(SKETCH72_W, SKETCH72_H)
    extrude(amount=BOSS_EXTRUDE34_DEPTH)

    # Sketch73 → Boss-Extrude35 (add)
    with BuildSketch(Plane(origin=(308.287008424, 0, 107.199982742), x_dir=(-0.3284378617669627, 0, 0.9445255798325134), z_dir=(-0.9445255798325134, 0, -0.3284378617669627))):
        with Locations((856.429727564, -38.71328926)):
            Rectangle(SKETCH73_W, SKETCH73_H)
    extrude(amount=BOSS_EXTRUDE35_DEPTH)

    # Sketch74 → Cut-Extrude27 (cut)
    with BuildSketch(Plane.XZ.offset(40.18)):
        with Locations(Location((18.400180873, 912.294602496, 0), (0, 0, 270))):
            Circle(SKETCH74_R)
        with Locations(Location((8.624341118, 908.895270636, 0), (0, 0, 270))):
            Circle(SKETCH74_R)
    extrude(amount=-CUT_EXTRUDE27_DEPTH, mode=Mode.SUBTRACT)


with BuildPart() as body_3_3:
    # Mirror3: mirrored copy
    add(body_3_2.part.mirror(Plane(origin=(-34.71161526, -43.25, 960.314964031), x_dir=(0, 0, 1), z_dir=(0, -1, 0))))


with BuildPart() as body_3_4:
    # Mirror4: read off the stored shape, not the designer's step
    # Mirror4: mirrored copy
    add(body_3_3.part.mirror(Plane(origin=(0, -43.25, 0), x_dir=(1, 0, 0), z_dir=(0, 1, 0))))


with BuildPart() as body_3_5:
    # Mirror5: mirrored copy
    add(body_3_4.part.mirror(Plane(origin=(-34.71161526, -43.25, 960.314964031), x_dir=(0, 0, 1), z_dir=(0, -1, 0))))

    # Sketch75 → Boss-Extrude36 (add)
    with BuildSketch(Plane(origin=(0, -68.5, 0), x_dir=(-1, 0, 0), z_dir=(0, -1, 0))):
        with BuildLine():
            Line((24.266128585, -978.146354464), (23.726128585, -988.183184315))
            ThreePointArc((23.726128585, -988.183184315), (31.795966631, -983.138510724), (39.865804676, -988.183184315))
            Line((39.865804676, -988.183184315), (39.266128585, -975.05646378))
            Line((39.266128585, -975.05646378), (24.308019321, -978.056409122))
            Line((24.308019321, -978.056409122), (24.302851007, -978.146354464))
            Line((24.302851007, -978.146354464), (24.266128585, -978.146354464))
        make_face()
    extrude(amount=-BOSS_EXTRUDE36_DEPTH)

    # Sketch76 → Boss-Extrude37 (add)
    with BuildSketch(Plane.XZ.offset(68.5)):
        with BuildLine():
            ThreePointArc((-1.645542313, 922.53507943), (5.240935017, 934.704313393), (18.191933959, 929.433122668))
            Line((18.191933959, 929.433122668), (11.67040627, 948.187810964))
            Line((11.67040627, 948.187810964), (-6.699400727, 937.069026653))
            Line((-6.699400727, 937.069026653), (-1.645542313, 922.53507943))
        make_face()
    extrude(amount=-BOSS_EXTRUDE37_DEPTH)

    # Sketch77 → Cut-Extrude28 (cut)
    with BuildSketch(Plane.XZ.offset(68.5)):
        with Locations((-32.524073244, 973.386354464)):
            Rectangle(SKETCH77_W, SKETCH77_H)
    extrude(amount=-CUT_EXTRUDE28_DEPTH, mode=Mode.SUBTRACT)

    # Sketch81 → Cut-Extrude29 (cut)
    with BuildSketch(Plane.XZ.offset(68.5)):
        Polygon((4.750153018, 947.612826843), (0.960073588, 946.334039168), (-2.830005841, 945.055251493), (-1.870915085, 942.21269192), (5.709243774, 944.770267271), align=None)
        Polygon((-0.780945581, 964.005933713), (-4.571025011, 962.727146038), (-8.36110444, 961.448358362), (-7.402013684, 958.60579879), (0.178145175, 961.163374141), align=None)
    extrude(amount=-CUT_EXTRUDE29_DEPTH, mode=Mode.SUBTRACT)


solid = Compound([cut_extrude11_piece_2_1.part, body_3_5.part])
